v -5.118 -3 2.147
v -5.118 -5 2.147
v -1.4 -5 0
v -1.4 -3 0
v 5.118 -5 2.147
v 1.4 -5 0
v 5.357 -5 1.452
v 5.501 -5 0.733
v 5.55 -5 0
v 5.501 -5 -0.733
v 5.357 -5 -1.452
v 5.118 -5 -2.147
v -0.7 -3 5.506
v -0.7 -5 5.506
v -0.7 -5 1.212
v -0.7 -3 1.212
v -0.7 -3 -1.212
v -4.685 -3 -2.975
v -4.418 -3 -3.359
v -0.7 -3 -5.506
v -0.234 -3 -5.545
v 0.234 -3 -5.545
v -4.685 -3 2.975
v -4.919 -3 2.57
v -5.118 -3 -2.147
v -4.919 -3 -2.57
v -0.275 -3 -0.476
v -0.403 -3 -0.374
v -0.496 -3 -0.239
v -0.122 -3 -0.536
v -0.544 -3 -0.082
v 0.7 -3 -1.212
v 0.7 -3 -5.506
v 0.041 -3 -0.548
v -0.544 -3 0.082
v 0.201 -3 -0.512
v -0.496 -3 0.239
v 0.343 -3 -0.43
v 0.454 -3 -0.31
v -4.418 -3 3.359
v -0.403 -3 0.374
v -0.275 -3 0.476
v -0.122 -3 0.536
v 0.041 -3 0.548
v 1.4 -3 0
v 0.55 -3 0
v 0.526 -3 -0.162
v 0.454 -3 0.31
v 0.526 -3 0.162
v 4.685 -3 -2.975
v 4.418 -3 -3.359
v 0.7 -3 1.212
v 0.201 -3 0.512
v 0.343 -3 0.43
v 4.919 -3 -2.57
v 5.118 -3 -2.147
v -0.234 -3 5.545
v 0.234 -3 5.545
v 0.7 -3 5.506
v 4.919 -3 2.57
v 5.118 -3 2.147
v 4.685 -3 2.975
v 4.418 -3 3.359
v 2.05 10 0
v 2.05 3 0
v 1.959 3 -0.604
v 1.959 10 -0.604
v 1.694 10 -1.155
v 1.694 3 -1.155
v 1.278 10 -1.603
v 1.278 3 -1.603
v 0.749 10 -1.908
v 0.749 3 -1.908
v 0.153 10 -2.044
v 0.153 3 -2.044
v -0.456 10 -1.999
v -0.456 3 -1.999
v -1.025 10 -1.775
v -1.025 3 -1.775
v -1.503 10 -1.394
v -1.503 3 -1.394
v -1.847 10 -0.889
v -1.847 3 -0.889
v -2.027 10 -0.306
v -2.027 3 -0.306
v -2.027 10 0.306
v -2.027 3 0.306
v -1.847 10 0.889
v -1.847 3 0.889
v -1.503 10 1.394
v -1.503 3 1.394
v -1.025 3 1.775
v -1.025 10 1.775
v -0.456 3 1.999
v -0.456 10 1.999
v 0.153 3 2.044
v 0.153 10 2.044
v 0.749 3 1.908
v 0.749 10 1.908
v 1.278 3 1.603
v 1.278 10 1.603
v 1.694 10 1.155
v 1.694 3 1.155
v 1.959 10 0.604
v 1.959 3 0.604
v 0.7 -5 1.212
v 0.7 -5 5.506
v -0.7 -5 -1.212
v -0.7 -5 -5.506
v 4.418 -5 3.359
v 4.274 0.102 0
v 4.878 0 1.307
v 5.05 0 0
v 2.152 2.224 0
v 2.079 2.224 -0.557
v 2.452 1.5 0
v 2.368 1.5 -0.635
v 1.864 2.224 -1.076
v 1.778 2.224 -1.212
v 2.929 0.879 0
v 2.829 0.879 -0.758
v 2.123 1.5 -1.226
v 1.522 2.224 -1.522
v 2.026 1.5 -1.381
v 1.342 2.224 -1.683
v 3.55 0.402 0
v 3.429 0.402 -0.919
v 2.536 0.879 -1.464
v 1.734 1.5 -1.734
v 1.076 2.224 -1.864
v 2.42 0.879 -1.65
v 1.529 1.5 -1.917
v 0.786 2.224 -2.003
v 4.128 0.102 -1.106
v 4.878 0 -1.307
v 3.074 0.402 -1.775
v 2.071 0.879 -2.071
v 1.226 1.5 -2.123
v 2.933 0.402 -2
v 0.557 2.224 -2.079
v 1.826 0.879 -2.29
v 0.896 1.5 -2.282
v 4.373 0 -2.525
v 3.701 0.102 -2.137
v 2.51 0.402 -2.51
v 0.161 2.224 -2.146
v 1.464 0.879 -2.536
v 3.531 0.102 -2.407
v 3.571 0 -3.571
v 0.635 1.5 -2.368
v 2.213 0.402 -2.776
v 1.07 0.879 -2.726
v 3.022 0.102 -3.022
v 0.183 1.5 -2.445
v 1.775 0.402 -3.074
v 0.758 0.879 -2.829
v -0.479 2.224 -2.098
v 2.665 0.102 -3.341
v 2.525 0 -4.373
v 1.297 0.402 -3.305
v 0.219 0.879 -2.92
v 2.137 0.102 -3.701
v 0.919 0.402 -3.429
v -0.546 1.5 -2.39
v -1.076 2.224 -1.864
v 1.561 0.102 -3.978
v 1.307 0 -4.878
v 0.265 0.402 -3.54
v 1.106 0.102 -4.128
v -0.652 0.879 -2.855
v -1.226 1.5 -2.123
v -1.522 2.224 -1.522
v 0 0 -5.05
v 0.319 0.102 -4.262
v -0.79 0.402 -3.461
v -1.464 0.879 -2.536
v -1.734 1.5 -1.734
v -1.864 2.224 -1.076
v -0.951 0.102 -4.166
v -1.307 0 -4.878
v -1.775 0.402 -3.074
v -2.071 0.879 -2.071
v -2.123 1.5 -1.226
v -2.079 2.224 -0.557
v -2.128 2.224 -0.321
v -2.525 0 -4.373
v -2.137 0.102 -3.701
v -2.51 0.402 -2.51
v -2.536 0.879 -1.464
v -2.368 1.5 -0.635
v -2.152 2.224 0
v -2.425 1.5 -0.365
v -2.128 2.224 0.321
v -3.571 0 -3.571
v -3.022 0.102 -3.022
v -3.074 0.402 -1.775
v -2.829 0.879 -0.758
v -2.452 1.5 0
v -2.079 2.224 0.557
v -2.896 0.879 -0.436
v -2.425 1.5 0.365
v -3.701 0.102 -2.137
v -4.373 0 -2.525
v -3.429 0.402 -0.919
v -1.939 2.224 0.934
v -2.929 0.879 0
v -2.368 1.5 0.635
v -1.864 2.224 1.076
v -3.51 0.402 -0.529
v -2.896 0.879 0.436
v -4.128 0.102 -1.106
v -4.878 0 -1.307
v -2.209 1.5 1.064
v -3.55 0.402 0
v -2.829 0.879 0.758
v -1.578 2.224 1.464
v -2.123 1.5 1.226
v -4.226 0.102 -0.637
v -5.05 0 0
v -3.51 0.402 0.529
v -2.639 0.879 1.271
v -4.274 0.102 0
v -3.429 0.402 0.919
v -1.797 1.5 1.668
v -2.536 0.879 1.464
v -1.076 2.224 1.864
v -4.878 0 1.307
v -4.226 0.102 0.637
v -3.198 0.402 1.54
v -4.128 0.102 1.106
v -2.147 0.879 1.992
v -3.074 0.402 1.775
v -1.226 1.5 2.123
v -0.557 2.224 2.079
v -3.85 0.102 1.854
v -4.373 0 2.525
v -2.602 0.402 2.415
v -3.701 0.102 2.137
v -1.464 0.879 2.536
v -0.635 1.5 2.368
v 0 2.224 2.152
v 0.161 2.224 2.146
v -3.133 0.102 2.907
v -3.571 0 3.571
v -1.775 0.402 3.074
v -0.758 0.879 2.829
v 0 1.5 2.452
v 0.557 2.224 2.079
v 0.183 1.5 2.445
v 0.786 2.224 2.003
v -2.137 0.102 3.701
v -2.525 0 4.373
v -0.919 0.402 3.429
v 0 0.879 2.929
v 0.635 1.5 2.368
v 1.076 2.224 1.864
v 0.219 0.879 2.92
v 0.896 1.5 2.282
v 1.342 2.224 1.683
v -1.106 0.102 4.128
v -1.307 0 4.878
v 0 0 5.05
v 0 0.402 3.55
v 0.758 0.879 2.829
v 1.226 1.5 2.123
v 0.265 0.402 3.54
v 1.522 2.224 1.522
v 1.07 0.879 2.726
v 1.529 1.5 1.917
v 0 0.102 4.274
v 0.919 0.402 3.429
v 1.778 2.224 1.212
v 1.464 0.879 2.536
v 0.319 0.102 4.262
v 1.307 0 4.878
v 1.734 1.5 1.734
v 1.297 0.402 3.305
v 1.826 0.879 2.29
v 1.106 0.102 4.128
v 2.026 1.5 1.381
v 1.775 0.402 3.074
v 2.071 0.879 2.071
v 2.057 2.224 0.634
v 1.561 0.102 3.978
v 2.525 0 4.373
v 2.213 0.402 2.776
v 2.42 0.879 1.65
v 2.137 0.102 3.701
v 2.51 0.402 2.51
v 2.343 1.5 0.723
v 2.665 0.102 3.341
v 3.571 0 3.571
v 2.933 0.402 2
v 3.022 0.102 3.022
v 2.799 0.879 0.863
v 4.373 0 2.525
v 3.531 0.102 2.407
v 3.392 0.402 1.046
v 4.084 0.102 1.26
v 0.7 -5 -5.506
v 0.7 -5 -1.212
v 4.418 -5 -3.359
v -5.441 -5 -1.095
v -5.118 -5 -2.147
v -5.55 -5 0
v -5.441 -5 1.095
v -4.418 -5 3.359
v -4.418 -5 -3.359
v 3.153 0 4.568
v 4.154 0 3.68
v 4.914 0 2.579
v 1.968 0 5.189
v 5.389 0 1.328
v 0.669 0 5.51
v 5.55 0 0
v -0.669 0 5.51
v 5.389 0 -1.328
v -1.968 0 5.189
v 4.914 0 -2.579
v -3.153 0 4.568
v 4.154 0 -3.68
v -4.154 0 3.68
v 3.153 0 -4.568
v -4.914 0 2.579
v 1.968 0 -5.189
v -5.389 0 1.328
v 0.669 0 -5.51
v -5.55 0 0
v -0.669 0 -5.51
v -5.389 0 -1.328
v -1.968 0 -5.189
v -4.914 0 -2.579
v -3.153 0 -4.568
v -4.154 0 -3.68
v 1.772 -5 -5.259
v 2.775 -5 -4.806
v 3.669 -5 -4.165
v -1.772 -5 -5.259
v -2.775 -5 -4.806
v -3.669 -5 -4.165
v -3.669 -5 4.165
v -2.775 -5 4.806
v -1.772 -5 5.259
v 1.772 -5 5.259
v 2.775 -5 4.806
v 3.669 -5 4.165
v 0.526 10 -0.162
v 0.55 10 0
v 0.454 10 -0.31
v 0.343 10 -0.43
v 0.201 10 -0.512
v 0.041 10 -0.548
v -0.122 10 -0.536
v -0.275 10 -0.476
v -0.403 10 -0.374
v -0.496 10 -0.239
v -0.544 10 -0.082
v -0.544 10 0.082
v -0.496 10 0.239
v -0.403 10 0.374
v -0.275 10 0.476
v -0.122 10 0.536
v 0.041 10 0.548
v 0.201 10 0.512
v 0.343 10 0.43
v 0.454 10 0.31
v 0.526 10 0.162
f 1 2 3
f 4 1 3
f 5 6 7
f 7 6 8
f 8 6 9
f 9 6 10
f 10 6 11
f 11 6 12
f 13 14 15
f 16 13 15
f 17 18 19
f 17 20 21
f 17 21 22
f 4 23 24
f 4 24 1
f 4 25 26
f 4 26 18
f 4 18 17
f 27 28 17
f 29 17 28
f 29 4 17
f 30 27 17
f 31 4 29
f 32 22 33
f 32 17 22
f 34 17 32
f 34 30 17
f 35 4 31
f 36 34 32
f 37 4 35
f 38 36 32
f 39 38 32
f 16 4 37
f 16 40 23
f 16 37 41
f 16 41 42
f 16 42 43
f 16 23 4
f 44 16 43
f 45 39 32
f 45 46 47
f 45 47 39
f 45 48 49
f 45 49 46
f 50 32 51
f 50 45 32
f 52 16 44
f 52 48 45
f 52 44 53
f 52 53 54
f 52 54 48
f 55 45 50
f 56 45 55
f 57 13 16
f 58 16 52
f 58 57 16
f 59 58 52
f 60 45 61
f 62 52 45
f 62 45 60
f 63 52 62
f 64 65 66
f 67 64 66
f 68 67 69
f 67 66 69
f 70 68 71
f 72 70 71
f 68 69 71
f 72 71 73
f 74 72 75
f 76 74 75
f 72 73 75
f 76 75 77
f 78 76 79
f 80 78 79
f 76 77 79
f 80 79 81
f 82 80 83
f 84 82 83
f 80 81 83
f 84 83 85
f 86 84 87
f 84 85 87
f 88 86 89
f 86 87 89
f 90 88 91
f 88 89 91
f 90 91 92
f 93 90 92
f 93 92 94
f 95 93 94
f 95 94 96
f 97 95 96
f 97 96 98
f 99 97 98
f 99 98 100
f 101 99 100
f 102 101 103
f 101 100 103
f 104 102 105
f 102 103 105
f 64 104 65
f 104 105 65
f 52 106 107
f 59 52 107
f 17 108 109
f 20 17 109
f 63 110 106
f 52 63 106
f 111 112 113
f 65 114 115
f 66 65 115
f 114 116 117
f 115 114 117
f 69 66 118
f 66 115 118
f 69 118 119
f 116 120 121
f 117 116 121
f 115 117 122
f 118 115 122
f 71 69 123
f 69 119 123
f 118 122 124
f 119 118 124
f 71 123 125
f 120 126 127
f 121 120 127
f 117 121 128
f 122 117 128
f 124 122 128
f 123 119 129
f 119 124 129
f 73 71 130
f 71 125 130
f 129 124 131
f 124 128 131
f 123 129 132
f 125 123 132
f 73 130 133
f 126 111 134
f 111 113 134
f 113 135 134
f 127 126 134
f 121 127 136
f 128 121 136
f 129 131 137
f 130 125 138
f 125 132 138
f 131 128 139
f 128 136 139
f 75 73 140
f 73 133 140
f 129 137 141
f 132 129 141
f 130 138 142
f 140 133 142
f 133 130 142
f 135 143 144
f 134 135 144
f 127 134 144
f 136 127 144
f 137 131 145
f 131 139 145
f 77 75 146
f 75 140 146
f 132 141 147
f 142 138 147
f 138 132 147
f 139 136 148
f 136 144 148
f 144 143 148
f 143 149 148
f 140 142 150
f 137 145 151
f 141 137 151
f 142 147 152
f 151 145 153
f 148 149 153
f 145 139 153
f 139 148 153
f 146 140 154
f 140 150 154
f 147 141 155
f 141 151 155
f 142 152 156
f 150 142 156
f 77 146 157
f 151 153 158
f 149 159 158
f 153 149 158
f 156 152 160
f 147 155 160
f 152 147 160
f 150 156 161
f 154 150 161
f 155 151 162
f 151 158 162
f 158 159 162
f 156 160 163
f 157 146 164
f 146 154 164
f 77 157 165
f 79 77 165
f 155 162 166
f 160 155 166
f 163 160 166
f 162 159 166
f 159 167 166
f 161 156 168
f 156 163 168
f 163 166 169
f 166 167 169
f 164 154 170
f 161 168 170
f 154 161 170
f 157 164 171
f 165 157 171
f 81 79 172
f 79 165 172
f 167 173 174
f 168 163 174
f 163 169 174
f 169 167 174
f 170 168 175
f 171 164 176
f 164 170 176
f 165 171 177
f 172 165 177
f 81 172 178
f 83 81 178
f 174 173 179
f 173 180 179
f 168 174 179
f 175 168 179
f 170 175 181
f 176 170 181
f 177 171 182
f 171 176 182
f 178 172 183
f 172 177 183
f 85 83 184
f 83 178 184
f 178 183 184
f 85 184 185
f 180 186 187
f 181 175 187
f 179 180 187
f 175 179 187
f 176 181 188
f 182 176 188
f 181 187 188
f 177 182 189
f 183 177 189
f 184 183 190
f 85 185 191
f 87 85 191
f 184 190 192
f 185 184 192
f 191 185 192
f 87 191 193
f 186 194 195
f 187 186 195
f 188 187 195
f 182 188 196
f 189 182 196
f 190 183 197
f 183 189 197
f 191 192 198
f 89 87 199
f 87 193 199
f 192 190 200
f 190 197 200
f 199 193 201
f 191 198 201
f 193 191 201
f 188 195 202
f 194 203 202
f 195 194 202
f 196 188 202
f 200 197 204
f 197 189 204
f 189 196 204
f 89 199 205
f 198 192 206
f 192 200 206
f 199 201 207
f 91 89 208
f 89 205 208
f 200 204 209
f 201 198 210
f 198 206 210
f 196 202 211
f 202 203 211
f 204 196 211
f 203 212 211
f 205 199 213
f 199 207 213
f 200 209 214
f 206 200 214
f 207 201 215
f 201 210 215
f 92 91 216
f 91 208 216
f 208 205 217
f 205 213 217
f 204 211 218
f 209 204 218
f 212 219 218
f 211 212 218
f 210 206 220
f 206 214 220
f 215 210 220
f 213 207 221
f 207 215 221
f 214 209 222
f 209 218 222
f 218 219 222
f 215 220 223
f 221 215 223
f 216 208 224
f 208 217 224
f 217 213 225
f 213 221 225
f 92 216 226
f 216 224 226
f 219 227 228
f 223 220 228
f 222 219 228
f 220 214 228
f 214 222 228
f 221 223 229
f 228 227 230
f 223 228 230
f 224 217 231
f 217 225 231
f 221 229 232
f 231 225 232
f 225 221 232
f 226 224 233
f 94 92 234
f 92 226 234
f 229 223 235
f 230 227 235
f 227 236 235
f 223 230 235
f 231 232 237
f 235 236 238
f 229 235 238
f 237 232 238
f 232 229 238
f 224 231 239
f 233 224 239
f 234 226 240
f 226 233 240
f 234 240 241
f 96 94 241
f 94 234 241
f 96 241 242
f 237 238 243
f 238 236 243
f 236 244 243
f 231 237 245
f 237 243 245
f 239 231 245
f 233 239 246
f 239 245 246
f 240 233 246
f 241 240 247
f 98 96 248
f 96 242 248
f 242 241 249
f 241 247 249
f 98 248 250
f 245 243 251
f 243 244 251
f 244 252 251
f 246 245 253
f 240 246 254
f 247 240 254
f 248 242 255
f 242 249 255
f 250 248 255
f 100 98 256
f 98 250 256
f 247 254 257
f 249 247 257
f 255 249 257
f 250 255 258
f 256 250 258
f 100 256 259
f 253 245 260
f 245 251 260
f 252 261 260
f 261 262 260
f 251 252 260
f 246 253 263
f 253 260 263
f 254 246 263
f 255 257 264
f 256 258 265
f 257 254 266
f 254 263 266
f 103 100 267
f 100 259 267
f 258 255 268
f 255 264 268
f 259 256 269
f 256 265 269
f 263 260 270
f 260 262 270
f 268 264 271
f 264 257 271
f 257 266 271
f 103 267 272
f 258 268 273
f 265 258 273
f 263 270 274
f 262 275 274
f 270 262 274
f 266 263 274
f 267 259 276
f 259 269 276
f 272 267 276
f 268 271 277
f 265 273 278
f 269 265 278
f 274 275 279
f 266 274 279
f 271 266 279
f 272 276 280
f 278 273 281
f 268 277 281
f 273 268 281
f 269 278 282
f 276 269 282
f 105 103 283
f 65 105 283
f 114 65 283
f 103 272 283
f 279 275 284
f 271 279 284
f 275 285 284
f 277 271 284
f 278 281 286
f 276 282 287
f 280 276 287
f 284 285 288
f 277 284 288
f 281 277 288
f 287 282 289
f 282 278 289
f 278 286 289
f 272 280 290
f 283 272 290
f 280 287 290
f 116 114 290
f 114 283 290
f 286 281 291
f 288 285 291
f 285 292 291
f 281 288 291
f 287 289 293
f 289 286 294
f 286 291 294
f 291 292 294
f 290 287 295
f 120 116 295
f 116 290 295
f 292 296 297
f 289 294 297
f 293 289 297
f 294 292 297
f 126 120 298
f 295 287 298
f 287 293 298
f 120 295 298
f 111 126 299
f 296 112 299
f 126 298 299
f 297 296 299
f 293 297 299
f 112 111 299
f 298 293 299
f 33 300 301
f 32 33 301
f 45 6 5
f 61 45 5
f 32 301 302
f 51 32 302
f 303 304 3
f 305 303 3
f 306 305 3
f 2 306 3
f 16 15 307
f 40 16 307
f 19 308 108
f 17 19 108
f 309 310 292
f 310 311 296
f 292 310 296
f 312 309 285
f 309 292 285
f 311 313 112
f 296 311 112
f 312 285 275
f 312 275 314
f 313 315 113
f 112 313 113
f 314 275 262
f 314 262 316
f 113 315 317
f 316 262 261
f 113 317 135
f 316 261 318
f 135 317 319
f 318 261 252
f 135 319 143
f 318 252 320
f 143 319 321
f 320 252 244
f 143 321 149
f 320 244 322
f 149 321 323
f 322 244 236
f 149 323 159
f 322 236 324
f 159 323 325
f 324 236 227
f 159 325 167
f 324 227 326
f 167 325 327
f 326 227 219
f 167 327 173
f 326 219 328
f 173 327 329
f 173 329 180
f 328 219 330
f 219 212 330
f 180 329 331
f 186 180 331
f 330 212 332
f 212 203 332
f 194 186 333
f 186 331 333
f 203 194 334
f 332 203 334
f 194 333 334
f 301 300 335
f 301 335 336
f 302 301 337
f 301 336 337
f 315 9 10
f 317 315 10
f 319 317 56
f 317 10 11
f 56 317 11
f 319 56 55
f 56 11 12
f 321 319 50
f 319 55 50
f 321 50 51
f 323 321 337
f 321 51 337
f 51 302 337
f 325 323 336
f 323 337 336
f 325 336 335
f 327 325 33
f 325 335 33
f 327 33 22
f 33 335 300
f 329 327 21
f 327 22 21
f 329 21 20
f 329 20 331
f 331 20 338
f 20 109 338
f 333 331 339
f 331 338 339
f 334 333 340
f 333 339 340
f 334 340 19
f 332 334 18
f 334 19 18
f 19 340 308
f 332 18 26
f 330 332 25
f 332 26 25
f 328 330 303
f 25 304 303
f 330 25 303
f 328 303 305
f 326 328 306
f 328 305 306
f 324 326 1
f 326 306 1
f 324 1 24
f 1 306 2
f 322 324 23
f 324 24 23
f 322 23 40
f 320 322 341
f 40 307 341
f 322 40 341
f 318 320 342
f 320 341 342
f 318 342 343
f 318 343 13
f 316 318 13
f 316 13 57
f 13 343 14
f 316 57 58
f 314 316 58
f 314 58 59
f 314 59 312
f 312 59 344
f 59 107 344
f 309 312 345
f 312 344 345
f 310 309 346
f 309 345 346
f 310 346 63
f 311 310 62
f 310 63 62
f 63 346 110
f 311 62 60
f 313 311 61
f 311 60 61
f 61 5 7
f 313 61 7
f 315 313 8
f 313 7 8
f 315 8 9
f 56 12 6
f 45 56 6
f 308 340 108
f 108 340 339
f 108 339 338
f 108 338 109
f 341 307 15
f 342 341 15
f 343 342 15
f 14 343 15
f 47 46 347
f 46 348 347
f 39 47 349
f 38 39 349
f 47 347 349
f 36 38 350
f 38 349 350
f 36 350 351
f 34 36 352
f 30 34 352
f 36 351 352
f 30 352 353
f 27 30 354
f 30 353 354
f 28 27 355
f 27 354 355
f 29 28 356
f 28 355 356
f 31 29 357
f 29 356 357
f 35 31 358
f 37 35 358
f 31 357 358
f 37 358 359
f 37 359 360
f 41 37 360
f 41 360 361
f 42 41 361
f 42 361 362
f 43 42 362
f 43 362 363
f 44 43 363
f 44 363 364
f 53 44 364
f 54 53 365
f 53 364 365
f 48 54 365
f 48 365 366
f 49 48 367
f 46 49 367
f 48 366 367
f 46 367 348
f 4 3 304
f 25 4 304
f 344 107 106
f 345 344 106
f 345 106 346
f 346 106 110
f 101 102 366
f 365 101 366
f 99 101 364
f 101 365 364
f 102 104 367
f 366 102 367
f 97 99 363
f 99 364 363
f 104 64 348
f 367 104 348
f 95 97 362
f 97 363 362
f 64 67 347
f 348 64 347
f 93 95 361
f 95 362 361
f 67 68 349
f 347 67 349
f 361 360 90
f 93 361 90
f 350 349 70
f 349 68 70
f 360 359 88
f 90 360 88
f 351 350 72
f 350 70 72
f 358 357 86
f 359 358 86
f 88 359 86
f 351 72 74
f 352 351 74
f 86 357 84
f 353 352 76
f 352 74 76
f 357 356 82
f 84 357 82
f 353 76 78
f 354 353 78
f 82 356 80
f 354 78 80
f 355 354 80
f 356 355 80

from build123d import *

# Parameters (mm, degrees)
CORTE_EXTRUS_O2_DEPTH = 2
FILETE1_R             = 3


with BuildPart() as part:
    # Esboço1 → Revolução1 (revolve)
    with BuildSketch(Plane.XY):
        Polygon((0.55, 10), (2.05, 10), (2.05, 0), (5.55, 0), (5.55, -5), (0.55, -5), align=None)
    revolve(axis=Axis((0, 0, 0), (0, 1, 0)))

    # Esboço2 → Corte-extrusão2 (cut)
    with BuildSketch(Plane.XZ.offset(5)):
        Polygon((-0.7, 5.55), (-0.7, 1.212435565), (-4.456440991, 3.381217783), (-5.156440991, 2.168782217), (-1.4, 0), (-5.156440991, -2.168782217), (-4.456440991, -3.381217783), (-0.7, -1.212435565), (-0.7, -5.55), (0.7, -5.55), (0.7, -1.212435565), (4.456440991, -3.381217783), (5.156440991, -2.168782217), (1.4, 0), (5.156440991, 2.168782217), (4.456440991, 3.381217783), (0.7, 1.212435565), (0.7, 5.55), align=None)
    extrude(amount=-CORTE_EXTRUS_O2_DEPTH, mode=Mode.SUBTRACT)

    # Filete1
    filete1_edges = [part.edges().sort_by_distance(p)[0] for p in [
        (-2.05, 0, 0),
    ]]
    fillet(filete1_edges, radius=FILETE1_R)


solid = part.part
